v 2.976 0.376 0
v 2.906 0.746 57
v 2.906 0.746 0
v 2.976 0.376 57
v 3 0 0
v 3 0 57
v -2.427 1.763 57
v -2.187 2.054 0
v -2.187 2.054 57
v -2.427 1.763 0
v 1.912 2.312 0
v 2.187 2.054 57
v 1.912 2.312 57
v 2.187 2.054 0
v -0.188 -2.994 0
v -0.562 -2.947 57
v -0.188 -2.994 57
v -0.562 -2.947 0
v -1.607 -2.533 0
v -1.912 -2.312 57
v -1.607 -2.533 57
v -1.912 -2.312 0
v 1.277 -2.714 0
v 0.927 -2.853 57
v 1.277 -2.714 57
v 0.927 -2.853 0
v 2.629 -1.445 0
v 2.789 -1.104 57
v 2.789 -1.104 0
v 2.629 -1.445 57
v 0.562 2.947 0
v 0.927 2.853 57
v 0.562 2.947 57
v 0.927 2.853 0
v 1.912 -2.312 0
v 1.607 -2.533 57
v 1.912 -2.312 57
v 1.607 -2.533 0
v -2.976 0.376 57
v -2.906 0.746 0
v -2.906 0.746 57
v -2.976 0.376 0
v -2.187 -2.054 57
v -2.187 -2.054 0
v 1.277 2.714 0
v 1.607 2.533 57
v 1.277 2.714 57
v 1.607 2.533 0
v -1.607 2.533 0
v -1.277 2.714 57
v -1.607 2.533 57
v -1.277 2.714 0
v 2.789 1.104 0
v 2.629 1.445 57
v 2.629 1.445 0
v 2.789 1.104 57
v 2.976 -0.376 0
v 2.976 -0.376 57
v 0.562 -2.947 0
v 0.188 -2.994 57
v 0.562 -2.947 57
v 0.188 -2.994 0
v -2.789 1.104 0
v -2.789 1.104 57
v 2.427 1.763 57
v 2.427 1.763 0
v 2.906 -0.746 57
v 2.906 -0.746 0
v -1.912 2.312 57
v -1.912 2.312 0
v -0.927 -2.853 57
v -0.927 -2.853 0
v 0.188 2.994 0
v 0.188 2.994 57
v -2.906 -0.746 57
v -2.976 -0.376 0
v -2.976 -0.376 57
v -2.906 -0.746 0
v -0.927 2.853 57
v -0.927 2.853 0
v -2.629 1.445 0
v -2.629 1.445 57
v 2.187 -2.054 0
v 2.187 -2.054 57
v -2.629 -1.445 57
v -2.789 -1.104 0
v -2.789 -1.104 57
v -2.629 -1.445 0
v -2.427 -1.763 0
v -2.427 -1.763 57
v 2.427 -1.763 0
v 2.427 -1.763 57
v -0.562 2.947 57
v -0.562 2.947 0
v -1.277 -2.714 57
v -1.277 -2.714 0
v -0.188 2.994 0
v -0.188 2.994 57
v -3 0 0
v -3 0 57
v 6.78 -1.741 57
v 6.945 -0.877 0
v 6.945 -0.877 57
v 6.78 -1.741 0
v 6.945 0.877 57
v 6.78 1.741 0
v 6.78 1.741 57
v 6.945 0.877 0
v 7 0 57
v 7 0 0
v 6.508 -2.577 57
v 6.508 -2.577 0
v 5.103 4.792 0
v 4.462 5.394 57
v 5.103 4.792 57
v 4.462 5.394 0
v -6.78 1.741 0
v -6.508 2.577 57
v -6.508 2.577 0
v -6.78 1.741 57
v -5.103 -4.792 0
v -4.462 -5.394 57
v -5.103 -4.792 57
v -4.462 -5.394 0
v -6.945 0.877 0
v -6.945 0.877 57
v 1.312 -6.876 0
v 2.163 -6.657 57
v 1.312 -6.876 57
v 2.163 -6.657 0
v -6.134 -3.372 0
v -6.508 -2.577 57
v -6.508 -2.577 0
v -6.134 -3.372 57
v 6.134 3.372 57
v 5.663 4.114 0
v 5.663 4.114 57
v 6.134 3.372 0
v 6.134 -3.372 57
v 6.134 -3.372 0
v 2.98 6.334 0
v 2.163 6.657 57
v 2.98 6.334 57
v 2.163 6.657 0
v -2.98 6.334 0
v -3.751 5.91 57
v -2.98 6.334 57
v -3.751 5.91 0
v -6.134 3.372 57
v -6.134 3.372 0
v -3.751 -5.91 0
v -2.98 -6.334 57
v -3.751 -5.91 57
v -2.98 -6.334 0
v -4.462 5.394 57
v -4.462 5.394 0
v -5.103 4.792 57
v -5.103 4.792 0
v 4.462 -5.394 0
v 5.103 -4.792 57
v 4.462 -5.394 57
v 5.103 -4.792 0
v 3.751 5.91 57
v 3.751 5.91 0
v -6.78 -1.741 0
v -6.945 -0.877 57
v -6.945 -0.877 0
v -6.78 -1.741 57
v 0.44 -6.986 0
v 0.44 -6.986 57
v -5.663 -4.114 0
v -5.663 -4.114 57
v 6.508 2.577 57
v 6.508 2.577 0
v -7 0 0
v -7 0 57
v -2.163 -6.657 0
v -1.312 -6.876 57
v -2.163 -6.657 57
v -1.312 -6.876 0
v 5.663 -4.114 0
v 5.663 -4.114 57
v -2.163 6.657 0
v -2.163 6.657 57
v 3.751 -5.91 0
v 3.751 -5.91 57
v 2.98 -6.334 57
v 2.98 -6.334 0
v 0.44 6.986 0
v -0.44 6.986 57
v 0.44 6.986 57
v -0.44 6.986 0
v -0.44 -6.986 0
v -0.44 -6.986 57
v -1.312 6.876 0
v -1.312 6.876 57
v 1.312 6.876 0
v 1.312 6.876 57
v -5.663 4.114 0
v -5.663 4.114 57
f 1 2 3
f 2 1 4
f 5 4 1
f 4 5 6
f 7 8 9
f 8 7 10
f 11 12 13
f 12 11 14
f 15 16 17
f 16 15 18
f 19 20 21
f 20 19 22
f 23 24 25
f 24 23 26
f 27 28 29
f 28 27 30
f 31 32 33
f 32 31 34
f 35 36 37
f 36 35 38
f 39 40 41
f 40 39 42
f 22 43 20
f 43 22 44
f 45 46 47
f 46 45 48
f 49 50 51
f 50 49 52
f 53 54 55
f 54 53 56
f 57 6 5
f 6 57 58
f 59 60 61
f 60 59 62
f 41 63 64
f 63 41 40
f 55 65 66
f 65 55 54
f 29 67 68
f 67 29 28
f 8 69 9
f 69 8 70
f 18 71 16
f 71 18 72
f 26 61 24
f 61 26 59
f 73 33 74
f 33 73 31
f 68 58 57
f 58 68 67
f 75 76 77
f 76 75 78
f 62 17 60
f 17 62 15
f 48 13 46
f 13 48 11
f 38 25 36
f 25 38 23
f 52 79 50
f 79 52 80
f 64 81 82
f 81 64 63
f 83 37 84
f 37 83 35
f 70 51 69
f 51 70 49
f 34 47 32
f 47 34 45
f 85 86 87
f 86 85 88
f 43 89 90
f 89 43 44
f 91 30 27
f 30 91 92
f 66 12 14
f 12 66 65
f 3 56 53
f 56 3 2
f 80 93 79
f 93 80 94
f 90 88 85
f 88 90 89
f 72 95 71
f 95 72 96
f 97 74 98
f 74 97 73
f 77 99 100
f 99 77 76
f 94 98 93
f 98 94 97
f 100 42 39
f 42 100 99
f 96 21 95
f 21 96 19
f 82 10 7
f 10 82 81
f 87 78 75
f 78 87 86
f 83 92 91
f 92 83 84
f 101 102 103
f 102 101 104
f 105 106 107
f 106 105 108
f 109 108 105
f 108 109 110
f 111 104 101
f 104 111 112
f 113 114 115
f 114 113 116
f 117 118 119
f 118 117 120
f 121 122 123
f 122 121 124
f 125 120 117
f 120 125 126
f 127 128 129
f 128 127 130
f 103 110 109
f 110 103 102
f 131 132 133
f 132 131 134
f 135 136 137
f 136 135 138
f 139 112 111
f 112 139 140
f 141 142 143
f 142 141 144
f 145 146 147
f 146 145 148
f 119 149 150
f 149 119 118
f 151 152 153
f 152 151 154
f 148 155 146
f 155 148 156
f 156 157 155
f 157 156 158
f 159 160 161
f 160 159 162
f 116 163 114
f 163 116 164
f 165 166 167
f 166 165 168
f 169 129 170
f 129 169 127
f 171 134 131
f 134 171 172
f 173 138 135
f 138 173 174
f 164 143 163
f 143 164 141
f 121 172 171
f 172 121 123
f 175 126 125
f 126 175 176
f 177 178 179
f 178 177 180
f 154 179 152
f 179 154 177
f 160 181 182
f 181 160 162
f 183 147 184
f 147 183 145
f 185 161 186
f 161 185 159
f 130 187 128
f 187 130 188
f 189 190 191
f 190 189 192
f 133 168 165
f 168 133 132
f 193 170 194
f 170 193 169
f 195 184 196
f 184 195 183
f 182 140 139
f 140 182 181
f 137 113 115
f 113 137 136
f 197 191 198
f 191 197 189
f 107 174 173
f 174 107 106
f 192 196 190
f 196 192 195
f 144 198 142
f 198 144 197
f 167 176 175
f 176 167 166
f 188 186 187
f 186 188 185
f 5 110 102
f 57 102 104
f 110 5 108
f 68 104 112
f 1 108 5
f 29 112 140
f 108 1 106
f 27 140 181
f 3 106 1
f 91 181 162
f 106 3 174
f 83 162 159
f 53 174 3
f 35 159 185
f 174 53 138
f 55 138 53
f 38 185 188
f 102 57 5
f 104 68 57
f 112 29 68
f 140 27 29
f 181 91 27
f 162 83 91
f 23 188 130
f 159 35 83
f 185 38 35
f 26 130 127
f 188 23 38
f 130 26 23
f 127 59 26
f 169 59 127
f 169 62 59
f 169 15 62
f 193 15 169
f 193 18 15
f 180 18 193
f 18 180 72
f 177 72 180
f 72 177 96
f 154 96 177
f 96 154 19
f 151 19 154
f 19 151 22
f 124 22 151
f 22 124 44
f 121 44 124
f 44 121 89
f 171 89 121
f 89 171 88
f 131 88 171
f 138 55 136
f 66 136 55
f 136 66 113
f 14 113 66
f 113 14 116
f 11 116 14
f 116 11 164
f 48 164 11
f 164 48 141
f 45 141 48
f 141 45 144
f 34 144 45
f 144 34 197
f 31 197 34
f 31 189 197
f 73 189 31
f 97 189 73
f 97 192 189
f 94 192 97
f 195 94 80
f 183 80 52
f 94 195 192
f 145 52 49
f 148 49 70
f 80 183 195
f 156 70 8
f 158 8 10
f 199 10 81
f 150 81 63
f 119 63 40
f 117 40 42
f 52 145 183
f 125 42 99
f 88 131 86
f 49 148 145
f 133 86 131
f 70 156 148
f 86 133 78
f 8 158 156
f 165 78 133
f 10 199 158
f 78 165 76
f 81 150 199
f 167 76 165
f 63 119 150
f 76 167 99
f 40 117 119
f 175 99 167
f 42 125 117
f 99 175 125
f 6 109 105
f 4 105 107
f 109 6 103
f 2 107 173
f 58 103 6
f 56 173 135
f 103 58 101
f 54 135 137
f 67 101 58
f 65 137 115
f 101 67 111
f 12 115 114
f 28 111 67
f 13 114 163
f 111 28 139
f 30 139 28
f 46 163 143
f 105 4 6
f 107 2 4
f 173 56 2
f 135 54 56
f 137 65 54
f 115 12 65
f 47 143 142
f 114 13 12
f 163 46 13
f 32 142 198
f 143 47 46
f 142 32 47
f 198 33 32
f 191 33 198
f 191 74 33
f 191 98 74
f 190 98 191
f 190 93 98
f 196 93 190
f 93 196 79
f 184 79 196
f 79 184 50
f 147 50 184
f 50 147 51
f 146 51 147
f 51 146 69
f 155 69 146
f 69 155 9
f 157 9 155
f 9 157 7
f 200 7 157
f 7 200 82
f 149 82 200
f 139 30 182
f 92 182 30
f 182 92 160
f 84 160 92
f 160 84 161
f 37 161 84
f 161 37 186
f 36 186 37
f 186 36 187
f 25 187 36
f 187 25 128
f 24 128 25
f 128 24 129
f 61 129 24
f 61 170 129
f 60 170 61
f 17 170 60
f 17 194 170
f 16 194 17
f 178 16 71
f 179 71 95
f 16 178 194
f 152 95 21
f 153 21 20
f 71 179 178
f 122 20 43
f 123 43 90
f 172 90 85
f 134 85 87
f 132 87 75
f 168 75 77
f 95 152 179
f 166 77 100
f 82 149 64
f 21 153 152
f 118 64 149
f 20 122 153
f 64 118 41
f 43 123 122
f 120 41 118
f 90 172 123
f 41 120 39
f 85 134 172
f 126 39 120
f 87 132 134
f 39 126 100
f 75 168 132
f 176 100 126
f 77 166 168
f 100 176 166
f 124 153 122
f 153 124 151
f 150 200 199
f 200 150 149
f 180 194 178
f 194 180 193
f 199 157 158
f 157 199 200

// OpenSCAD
$fn = 50;


difference() {
	union() {
		cylinder(h = 57, r = 7.0000000000);
	}
	union() {
		translate(v = [0.0000000000, 0.0000000000, -100.0000000000]) {
			cylinder(h = 200, r = 3.0000000000);
		}
		cylinder(h = 57, r = 1.5000000000);
		cylinder(h = 57, r = 1.5000000000);
		cylinder(h = 57, r = 1.5000000000);
	}
}
